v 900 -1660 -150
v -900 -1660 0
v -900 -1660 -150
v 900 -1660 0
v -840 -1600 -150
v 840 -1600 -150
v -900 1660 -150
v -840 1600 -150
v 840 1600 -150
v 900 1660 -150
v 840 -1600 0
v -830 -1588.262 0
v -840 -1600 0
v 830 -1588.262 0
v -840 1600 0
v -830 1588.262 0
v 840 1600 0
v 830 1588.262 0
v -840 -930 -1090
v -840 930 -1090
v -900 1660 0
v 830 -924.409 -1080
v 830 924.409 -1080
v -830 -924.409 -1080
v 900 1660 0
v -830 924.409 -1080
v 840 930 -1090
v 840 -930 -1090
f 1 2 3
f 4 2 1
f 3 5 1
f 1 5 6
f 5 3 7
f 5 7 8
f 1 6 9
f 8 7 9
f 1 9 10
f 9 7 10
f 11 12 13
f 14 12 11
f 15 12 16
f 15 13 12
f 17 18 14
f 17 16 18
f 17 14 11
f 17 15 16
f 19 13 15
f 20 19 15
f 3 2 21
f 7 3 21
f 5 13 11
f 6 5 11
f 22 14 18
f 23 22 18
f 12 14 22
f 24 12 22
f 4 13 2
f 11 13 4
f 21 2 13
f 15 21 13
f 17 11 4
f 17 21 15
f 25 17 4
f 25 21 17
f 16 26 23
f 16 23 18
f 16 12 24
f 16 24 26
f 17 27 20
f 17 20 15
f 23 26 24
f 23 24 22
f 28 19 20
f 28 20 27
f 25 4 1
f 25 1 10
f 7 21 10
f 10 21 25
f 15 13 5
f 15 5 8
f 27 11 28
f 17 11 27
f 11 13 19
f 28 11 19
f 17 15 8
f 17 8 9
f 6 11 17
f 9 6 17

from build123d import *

# Parameters (mm, degrees)
F0_W     = 1680
F0_H     = 3200
F1_DEPTH = 1090
F3_DEPTH = 1680.001
F4_T     = -10
F0_W_2   = 1800
F0_H_2   = 3320
F5_DEPTH = 150


with BuildPart() as f1:
    # F0 (on Top) → F1 (new body)
    with BuildSketch(Plane.XY):
        Rectangle(F0_W, F0_H)
    extrude(amount=-F1_DEPTH)

    # F2 (on face) → F3 (cut, through all)
    with BuildSketch(Plane(origin=(-840, 0, 0), x_dir=(0, -1, 0), z_dir=(-1, 0, 0))):
        Polygon((-930, -1090), (-1600, 0), (-1600, -1090), align=None)
        Polygon((1600, -1090), (1600, 0), (930, -1090), align=None)
    extrude(amount=-F3_DEPTH, mode=Mode.SUBTRACT)

    # F4
    f4_openings = [f1.faces().sort_by_distance(p)[0] for p in [
        (0, 0, 0),
    ]]
    offset(amount=F4_T, openings=f4_openings)


with BuildPart() as f5:
    # F0 (on Top) → F5 (new body)
    with BuildSketch(Plane.XY):
        Rectangle(F0_W_2, F0_H_2)
        Rectangle(F0_W, F0_H, mode=Mode.SUBTRACT)
    extrude(amount=-F5_DEPTH)


solid = Compound([f1.part, f5.part])
